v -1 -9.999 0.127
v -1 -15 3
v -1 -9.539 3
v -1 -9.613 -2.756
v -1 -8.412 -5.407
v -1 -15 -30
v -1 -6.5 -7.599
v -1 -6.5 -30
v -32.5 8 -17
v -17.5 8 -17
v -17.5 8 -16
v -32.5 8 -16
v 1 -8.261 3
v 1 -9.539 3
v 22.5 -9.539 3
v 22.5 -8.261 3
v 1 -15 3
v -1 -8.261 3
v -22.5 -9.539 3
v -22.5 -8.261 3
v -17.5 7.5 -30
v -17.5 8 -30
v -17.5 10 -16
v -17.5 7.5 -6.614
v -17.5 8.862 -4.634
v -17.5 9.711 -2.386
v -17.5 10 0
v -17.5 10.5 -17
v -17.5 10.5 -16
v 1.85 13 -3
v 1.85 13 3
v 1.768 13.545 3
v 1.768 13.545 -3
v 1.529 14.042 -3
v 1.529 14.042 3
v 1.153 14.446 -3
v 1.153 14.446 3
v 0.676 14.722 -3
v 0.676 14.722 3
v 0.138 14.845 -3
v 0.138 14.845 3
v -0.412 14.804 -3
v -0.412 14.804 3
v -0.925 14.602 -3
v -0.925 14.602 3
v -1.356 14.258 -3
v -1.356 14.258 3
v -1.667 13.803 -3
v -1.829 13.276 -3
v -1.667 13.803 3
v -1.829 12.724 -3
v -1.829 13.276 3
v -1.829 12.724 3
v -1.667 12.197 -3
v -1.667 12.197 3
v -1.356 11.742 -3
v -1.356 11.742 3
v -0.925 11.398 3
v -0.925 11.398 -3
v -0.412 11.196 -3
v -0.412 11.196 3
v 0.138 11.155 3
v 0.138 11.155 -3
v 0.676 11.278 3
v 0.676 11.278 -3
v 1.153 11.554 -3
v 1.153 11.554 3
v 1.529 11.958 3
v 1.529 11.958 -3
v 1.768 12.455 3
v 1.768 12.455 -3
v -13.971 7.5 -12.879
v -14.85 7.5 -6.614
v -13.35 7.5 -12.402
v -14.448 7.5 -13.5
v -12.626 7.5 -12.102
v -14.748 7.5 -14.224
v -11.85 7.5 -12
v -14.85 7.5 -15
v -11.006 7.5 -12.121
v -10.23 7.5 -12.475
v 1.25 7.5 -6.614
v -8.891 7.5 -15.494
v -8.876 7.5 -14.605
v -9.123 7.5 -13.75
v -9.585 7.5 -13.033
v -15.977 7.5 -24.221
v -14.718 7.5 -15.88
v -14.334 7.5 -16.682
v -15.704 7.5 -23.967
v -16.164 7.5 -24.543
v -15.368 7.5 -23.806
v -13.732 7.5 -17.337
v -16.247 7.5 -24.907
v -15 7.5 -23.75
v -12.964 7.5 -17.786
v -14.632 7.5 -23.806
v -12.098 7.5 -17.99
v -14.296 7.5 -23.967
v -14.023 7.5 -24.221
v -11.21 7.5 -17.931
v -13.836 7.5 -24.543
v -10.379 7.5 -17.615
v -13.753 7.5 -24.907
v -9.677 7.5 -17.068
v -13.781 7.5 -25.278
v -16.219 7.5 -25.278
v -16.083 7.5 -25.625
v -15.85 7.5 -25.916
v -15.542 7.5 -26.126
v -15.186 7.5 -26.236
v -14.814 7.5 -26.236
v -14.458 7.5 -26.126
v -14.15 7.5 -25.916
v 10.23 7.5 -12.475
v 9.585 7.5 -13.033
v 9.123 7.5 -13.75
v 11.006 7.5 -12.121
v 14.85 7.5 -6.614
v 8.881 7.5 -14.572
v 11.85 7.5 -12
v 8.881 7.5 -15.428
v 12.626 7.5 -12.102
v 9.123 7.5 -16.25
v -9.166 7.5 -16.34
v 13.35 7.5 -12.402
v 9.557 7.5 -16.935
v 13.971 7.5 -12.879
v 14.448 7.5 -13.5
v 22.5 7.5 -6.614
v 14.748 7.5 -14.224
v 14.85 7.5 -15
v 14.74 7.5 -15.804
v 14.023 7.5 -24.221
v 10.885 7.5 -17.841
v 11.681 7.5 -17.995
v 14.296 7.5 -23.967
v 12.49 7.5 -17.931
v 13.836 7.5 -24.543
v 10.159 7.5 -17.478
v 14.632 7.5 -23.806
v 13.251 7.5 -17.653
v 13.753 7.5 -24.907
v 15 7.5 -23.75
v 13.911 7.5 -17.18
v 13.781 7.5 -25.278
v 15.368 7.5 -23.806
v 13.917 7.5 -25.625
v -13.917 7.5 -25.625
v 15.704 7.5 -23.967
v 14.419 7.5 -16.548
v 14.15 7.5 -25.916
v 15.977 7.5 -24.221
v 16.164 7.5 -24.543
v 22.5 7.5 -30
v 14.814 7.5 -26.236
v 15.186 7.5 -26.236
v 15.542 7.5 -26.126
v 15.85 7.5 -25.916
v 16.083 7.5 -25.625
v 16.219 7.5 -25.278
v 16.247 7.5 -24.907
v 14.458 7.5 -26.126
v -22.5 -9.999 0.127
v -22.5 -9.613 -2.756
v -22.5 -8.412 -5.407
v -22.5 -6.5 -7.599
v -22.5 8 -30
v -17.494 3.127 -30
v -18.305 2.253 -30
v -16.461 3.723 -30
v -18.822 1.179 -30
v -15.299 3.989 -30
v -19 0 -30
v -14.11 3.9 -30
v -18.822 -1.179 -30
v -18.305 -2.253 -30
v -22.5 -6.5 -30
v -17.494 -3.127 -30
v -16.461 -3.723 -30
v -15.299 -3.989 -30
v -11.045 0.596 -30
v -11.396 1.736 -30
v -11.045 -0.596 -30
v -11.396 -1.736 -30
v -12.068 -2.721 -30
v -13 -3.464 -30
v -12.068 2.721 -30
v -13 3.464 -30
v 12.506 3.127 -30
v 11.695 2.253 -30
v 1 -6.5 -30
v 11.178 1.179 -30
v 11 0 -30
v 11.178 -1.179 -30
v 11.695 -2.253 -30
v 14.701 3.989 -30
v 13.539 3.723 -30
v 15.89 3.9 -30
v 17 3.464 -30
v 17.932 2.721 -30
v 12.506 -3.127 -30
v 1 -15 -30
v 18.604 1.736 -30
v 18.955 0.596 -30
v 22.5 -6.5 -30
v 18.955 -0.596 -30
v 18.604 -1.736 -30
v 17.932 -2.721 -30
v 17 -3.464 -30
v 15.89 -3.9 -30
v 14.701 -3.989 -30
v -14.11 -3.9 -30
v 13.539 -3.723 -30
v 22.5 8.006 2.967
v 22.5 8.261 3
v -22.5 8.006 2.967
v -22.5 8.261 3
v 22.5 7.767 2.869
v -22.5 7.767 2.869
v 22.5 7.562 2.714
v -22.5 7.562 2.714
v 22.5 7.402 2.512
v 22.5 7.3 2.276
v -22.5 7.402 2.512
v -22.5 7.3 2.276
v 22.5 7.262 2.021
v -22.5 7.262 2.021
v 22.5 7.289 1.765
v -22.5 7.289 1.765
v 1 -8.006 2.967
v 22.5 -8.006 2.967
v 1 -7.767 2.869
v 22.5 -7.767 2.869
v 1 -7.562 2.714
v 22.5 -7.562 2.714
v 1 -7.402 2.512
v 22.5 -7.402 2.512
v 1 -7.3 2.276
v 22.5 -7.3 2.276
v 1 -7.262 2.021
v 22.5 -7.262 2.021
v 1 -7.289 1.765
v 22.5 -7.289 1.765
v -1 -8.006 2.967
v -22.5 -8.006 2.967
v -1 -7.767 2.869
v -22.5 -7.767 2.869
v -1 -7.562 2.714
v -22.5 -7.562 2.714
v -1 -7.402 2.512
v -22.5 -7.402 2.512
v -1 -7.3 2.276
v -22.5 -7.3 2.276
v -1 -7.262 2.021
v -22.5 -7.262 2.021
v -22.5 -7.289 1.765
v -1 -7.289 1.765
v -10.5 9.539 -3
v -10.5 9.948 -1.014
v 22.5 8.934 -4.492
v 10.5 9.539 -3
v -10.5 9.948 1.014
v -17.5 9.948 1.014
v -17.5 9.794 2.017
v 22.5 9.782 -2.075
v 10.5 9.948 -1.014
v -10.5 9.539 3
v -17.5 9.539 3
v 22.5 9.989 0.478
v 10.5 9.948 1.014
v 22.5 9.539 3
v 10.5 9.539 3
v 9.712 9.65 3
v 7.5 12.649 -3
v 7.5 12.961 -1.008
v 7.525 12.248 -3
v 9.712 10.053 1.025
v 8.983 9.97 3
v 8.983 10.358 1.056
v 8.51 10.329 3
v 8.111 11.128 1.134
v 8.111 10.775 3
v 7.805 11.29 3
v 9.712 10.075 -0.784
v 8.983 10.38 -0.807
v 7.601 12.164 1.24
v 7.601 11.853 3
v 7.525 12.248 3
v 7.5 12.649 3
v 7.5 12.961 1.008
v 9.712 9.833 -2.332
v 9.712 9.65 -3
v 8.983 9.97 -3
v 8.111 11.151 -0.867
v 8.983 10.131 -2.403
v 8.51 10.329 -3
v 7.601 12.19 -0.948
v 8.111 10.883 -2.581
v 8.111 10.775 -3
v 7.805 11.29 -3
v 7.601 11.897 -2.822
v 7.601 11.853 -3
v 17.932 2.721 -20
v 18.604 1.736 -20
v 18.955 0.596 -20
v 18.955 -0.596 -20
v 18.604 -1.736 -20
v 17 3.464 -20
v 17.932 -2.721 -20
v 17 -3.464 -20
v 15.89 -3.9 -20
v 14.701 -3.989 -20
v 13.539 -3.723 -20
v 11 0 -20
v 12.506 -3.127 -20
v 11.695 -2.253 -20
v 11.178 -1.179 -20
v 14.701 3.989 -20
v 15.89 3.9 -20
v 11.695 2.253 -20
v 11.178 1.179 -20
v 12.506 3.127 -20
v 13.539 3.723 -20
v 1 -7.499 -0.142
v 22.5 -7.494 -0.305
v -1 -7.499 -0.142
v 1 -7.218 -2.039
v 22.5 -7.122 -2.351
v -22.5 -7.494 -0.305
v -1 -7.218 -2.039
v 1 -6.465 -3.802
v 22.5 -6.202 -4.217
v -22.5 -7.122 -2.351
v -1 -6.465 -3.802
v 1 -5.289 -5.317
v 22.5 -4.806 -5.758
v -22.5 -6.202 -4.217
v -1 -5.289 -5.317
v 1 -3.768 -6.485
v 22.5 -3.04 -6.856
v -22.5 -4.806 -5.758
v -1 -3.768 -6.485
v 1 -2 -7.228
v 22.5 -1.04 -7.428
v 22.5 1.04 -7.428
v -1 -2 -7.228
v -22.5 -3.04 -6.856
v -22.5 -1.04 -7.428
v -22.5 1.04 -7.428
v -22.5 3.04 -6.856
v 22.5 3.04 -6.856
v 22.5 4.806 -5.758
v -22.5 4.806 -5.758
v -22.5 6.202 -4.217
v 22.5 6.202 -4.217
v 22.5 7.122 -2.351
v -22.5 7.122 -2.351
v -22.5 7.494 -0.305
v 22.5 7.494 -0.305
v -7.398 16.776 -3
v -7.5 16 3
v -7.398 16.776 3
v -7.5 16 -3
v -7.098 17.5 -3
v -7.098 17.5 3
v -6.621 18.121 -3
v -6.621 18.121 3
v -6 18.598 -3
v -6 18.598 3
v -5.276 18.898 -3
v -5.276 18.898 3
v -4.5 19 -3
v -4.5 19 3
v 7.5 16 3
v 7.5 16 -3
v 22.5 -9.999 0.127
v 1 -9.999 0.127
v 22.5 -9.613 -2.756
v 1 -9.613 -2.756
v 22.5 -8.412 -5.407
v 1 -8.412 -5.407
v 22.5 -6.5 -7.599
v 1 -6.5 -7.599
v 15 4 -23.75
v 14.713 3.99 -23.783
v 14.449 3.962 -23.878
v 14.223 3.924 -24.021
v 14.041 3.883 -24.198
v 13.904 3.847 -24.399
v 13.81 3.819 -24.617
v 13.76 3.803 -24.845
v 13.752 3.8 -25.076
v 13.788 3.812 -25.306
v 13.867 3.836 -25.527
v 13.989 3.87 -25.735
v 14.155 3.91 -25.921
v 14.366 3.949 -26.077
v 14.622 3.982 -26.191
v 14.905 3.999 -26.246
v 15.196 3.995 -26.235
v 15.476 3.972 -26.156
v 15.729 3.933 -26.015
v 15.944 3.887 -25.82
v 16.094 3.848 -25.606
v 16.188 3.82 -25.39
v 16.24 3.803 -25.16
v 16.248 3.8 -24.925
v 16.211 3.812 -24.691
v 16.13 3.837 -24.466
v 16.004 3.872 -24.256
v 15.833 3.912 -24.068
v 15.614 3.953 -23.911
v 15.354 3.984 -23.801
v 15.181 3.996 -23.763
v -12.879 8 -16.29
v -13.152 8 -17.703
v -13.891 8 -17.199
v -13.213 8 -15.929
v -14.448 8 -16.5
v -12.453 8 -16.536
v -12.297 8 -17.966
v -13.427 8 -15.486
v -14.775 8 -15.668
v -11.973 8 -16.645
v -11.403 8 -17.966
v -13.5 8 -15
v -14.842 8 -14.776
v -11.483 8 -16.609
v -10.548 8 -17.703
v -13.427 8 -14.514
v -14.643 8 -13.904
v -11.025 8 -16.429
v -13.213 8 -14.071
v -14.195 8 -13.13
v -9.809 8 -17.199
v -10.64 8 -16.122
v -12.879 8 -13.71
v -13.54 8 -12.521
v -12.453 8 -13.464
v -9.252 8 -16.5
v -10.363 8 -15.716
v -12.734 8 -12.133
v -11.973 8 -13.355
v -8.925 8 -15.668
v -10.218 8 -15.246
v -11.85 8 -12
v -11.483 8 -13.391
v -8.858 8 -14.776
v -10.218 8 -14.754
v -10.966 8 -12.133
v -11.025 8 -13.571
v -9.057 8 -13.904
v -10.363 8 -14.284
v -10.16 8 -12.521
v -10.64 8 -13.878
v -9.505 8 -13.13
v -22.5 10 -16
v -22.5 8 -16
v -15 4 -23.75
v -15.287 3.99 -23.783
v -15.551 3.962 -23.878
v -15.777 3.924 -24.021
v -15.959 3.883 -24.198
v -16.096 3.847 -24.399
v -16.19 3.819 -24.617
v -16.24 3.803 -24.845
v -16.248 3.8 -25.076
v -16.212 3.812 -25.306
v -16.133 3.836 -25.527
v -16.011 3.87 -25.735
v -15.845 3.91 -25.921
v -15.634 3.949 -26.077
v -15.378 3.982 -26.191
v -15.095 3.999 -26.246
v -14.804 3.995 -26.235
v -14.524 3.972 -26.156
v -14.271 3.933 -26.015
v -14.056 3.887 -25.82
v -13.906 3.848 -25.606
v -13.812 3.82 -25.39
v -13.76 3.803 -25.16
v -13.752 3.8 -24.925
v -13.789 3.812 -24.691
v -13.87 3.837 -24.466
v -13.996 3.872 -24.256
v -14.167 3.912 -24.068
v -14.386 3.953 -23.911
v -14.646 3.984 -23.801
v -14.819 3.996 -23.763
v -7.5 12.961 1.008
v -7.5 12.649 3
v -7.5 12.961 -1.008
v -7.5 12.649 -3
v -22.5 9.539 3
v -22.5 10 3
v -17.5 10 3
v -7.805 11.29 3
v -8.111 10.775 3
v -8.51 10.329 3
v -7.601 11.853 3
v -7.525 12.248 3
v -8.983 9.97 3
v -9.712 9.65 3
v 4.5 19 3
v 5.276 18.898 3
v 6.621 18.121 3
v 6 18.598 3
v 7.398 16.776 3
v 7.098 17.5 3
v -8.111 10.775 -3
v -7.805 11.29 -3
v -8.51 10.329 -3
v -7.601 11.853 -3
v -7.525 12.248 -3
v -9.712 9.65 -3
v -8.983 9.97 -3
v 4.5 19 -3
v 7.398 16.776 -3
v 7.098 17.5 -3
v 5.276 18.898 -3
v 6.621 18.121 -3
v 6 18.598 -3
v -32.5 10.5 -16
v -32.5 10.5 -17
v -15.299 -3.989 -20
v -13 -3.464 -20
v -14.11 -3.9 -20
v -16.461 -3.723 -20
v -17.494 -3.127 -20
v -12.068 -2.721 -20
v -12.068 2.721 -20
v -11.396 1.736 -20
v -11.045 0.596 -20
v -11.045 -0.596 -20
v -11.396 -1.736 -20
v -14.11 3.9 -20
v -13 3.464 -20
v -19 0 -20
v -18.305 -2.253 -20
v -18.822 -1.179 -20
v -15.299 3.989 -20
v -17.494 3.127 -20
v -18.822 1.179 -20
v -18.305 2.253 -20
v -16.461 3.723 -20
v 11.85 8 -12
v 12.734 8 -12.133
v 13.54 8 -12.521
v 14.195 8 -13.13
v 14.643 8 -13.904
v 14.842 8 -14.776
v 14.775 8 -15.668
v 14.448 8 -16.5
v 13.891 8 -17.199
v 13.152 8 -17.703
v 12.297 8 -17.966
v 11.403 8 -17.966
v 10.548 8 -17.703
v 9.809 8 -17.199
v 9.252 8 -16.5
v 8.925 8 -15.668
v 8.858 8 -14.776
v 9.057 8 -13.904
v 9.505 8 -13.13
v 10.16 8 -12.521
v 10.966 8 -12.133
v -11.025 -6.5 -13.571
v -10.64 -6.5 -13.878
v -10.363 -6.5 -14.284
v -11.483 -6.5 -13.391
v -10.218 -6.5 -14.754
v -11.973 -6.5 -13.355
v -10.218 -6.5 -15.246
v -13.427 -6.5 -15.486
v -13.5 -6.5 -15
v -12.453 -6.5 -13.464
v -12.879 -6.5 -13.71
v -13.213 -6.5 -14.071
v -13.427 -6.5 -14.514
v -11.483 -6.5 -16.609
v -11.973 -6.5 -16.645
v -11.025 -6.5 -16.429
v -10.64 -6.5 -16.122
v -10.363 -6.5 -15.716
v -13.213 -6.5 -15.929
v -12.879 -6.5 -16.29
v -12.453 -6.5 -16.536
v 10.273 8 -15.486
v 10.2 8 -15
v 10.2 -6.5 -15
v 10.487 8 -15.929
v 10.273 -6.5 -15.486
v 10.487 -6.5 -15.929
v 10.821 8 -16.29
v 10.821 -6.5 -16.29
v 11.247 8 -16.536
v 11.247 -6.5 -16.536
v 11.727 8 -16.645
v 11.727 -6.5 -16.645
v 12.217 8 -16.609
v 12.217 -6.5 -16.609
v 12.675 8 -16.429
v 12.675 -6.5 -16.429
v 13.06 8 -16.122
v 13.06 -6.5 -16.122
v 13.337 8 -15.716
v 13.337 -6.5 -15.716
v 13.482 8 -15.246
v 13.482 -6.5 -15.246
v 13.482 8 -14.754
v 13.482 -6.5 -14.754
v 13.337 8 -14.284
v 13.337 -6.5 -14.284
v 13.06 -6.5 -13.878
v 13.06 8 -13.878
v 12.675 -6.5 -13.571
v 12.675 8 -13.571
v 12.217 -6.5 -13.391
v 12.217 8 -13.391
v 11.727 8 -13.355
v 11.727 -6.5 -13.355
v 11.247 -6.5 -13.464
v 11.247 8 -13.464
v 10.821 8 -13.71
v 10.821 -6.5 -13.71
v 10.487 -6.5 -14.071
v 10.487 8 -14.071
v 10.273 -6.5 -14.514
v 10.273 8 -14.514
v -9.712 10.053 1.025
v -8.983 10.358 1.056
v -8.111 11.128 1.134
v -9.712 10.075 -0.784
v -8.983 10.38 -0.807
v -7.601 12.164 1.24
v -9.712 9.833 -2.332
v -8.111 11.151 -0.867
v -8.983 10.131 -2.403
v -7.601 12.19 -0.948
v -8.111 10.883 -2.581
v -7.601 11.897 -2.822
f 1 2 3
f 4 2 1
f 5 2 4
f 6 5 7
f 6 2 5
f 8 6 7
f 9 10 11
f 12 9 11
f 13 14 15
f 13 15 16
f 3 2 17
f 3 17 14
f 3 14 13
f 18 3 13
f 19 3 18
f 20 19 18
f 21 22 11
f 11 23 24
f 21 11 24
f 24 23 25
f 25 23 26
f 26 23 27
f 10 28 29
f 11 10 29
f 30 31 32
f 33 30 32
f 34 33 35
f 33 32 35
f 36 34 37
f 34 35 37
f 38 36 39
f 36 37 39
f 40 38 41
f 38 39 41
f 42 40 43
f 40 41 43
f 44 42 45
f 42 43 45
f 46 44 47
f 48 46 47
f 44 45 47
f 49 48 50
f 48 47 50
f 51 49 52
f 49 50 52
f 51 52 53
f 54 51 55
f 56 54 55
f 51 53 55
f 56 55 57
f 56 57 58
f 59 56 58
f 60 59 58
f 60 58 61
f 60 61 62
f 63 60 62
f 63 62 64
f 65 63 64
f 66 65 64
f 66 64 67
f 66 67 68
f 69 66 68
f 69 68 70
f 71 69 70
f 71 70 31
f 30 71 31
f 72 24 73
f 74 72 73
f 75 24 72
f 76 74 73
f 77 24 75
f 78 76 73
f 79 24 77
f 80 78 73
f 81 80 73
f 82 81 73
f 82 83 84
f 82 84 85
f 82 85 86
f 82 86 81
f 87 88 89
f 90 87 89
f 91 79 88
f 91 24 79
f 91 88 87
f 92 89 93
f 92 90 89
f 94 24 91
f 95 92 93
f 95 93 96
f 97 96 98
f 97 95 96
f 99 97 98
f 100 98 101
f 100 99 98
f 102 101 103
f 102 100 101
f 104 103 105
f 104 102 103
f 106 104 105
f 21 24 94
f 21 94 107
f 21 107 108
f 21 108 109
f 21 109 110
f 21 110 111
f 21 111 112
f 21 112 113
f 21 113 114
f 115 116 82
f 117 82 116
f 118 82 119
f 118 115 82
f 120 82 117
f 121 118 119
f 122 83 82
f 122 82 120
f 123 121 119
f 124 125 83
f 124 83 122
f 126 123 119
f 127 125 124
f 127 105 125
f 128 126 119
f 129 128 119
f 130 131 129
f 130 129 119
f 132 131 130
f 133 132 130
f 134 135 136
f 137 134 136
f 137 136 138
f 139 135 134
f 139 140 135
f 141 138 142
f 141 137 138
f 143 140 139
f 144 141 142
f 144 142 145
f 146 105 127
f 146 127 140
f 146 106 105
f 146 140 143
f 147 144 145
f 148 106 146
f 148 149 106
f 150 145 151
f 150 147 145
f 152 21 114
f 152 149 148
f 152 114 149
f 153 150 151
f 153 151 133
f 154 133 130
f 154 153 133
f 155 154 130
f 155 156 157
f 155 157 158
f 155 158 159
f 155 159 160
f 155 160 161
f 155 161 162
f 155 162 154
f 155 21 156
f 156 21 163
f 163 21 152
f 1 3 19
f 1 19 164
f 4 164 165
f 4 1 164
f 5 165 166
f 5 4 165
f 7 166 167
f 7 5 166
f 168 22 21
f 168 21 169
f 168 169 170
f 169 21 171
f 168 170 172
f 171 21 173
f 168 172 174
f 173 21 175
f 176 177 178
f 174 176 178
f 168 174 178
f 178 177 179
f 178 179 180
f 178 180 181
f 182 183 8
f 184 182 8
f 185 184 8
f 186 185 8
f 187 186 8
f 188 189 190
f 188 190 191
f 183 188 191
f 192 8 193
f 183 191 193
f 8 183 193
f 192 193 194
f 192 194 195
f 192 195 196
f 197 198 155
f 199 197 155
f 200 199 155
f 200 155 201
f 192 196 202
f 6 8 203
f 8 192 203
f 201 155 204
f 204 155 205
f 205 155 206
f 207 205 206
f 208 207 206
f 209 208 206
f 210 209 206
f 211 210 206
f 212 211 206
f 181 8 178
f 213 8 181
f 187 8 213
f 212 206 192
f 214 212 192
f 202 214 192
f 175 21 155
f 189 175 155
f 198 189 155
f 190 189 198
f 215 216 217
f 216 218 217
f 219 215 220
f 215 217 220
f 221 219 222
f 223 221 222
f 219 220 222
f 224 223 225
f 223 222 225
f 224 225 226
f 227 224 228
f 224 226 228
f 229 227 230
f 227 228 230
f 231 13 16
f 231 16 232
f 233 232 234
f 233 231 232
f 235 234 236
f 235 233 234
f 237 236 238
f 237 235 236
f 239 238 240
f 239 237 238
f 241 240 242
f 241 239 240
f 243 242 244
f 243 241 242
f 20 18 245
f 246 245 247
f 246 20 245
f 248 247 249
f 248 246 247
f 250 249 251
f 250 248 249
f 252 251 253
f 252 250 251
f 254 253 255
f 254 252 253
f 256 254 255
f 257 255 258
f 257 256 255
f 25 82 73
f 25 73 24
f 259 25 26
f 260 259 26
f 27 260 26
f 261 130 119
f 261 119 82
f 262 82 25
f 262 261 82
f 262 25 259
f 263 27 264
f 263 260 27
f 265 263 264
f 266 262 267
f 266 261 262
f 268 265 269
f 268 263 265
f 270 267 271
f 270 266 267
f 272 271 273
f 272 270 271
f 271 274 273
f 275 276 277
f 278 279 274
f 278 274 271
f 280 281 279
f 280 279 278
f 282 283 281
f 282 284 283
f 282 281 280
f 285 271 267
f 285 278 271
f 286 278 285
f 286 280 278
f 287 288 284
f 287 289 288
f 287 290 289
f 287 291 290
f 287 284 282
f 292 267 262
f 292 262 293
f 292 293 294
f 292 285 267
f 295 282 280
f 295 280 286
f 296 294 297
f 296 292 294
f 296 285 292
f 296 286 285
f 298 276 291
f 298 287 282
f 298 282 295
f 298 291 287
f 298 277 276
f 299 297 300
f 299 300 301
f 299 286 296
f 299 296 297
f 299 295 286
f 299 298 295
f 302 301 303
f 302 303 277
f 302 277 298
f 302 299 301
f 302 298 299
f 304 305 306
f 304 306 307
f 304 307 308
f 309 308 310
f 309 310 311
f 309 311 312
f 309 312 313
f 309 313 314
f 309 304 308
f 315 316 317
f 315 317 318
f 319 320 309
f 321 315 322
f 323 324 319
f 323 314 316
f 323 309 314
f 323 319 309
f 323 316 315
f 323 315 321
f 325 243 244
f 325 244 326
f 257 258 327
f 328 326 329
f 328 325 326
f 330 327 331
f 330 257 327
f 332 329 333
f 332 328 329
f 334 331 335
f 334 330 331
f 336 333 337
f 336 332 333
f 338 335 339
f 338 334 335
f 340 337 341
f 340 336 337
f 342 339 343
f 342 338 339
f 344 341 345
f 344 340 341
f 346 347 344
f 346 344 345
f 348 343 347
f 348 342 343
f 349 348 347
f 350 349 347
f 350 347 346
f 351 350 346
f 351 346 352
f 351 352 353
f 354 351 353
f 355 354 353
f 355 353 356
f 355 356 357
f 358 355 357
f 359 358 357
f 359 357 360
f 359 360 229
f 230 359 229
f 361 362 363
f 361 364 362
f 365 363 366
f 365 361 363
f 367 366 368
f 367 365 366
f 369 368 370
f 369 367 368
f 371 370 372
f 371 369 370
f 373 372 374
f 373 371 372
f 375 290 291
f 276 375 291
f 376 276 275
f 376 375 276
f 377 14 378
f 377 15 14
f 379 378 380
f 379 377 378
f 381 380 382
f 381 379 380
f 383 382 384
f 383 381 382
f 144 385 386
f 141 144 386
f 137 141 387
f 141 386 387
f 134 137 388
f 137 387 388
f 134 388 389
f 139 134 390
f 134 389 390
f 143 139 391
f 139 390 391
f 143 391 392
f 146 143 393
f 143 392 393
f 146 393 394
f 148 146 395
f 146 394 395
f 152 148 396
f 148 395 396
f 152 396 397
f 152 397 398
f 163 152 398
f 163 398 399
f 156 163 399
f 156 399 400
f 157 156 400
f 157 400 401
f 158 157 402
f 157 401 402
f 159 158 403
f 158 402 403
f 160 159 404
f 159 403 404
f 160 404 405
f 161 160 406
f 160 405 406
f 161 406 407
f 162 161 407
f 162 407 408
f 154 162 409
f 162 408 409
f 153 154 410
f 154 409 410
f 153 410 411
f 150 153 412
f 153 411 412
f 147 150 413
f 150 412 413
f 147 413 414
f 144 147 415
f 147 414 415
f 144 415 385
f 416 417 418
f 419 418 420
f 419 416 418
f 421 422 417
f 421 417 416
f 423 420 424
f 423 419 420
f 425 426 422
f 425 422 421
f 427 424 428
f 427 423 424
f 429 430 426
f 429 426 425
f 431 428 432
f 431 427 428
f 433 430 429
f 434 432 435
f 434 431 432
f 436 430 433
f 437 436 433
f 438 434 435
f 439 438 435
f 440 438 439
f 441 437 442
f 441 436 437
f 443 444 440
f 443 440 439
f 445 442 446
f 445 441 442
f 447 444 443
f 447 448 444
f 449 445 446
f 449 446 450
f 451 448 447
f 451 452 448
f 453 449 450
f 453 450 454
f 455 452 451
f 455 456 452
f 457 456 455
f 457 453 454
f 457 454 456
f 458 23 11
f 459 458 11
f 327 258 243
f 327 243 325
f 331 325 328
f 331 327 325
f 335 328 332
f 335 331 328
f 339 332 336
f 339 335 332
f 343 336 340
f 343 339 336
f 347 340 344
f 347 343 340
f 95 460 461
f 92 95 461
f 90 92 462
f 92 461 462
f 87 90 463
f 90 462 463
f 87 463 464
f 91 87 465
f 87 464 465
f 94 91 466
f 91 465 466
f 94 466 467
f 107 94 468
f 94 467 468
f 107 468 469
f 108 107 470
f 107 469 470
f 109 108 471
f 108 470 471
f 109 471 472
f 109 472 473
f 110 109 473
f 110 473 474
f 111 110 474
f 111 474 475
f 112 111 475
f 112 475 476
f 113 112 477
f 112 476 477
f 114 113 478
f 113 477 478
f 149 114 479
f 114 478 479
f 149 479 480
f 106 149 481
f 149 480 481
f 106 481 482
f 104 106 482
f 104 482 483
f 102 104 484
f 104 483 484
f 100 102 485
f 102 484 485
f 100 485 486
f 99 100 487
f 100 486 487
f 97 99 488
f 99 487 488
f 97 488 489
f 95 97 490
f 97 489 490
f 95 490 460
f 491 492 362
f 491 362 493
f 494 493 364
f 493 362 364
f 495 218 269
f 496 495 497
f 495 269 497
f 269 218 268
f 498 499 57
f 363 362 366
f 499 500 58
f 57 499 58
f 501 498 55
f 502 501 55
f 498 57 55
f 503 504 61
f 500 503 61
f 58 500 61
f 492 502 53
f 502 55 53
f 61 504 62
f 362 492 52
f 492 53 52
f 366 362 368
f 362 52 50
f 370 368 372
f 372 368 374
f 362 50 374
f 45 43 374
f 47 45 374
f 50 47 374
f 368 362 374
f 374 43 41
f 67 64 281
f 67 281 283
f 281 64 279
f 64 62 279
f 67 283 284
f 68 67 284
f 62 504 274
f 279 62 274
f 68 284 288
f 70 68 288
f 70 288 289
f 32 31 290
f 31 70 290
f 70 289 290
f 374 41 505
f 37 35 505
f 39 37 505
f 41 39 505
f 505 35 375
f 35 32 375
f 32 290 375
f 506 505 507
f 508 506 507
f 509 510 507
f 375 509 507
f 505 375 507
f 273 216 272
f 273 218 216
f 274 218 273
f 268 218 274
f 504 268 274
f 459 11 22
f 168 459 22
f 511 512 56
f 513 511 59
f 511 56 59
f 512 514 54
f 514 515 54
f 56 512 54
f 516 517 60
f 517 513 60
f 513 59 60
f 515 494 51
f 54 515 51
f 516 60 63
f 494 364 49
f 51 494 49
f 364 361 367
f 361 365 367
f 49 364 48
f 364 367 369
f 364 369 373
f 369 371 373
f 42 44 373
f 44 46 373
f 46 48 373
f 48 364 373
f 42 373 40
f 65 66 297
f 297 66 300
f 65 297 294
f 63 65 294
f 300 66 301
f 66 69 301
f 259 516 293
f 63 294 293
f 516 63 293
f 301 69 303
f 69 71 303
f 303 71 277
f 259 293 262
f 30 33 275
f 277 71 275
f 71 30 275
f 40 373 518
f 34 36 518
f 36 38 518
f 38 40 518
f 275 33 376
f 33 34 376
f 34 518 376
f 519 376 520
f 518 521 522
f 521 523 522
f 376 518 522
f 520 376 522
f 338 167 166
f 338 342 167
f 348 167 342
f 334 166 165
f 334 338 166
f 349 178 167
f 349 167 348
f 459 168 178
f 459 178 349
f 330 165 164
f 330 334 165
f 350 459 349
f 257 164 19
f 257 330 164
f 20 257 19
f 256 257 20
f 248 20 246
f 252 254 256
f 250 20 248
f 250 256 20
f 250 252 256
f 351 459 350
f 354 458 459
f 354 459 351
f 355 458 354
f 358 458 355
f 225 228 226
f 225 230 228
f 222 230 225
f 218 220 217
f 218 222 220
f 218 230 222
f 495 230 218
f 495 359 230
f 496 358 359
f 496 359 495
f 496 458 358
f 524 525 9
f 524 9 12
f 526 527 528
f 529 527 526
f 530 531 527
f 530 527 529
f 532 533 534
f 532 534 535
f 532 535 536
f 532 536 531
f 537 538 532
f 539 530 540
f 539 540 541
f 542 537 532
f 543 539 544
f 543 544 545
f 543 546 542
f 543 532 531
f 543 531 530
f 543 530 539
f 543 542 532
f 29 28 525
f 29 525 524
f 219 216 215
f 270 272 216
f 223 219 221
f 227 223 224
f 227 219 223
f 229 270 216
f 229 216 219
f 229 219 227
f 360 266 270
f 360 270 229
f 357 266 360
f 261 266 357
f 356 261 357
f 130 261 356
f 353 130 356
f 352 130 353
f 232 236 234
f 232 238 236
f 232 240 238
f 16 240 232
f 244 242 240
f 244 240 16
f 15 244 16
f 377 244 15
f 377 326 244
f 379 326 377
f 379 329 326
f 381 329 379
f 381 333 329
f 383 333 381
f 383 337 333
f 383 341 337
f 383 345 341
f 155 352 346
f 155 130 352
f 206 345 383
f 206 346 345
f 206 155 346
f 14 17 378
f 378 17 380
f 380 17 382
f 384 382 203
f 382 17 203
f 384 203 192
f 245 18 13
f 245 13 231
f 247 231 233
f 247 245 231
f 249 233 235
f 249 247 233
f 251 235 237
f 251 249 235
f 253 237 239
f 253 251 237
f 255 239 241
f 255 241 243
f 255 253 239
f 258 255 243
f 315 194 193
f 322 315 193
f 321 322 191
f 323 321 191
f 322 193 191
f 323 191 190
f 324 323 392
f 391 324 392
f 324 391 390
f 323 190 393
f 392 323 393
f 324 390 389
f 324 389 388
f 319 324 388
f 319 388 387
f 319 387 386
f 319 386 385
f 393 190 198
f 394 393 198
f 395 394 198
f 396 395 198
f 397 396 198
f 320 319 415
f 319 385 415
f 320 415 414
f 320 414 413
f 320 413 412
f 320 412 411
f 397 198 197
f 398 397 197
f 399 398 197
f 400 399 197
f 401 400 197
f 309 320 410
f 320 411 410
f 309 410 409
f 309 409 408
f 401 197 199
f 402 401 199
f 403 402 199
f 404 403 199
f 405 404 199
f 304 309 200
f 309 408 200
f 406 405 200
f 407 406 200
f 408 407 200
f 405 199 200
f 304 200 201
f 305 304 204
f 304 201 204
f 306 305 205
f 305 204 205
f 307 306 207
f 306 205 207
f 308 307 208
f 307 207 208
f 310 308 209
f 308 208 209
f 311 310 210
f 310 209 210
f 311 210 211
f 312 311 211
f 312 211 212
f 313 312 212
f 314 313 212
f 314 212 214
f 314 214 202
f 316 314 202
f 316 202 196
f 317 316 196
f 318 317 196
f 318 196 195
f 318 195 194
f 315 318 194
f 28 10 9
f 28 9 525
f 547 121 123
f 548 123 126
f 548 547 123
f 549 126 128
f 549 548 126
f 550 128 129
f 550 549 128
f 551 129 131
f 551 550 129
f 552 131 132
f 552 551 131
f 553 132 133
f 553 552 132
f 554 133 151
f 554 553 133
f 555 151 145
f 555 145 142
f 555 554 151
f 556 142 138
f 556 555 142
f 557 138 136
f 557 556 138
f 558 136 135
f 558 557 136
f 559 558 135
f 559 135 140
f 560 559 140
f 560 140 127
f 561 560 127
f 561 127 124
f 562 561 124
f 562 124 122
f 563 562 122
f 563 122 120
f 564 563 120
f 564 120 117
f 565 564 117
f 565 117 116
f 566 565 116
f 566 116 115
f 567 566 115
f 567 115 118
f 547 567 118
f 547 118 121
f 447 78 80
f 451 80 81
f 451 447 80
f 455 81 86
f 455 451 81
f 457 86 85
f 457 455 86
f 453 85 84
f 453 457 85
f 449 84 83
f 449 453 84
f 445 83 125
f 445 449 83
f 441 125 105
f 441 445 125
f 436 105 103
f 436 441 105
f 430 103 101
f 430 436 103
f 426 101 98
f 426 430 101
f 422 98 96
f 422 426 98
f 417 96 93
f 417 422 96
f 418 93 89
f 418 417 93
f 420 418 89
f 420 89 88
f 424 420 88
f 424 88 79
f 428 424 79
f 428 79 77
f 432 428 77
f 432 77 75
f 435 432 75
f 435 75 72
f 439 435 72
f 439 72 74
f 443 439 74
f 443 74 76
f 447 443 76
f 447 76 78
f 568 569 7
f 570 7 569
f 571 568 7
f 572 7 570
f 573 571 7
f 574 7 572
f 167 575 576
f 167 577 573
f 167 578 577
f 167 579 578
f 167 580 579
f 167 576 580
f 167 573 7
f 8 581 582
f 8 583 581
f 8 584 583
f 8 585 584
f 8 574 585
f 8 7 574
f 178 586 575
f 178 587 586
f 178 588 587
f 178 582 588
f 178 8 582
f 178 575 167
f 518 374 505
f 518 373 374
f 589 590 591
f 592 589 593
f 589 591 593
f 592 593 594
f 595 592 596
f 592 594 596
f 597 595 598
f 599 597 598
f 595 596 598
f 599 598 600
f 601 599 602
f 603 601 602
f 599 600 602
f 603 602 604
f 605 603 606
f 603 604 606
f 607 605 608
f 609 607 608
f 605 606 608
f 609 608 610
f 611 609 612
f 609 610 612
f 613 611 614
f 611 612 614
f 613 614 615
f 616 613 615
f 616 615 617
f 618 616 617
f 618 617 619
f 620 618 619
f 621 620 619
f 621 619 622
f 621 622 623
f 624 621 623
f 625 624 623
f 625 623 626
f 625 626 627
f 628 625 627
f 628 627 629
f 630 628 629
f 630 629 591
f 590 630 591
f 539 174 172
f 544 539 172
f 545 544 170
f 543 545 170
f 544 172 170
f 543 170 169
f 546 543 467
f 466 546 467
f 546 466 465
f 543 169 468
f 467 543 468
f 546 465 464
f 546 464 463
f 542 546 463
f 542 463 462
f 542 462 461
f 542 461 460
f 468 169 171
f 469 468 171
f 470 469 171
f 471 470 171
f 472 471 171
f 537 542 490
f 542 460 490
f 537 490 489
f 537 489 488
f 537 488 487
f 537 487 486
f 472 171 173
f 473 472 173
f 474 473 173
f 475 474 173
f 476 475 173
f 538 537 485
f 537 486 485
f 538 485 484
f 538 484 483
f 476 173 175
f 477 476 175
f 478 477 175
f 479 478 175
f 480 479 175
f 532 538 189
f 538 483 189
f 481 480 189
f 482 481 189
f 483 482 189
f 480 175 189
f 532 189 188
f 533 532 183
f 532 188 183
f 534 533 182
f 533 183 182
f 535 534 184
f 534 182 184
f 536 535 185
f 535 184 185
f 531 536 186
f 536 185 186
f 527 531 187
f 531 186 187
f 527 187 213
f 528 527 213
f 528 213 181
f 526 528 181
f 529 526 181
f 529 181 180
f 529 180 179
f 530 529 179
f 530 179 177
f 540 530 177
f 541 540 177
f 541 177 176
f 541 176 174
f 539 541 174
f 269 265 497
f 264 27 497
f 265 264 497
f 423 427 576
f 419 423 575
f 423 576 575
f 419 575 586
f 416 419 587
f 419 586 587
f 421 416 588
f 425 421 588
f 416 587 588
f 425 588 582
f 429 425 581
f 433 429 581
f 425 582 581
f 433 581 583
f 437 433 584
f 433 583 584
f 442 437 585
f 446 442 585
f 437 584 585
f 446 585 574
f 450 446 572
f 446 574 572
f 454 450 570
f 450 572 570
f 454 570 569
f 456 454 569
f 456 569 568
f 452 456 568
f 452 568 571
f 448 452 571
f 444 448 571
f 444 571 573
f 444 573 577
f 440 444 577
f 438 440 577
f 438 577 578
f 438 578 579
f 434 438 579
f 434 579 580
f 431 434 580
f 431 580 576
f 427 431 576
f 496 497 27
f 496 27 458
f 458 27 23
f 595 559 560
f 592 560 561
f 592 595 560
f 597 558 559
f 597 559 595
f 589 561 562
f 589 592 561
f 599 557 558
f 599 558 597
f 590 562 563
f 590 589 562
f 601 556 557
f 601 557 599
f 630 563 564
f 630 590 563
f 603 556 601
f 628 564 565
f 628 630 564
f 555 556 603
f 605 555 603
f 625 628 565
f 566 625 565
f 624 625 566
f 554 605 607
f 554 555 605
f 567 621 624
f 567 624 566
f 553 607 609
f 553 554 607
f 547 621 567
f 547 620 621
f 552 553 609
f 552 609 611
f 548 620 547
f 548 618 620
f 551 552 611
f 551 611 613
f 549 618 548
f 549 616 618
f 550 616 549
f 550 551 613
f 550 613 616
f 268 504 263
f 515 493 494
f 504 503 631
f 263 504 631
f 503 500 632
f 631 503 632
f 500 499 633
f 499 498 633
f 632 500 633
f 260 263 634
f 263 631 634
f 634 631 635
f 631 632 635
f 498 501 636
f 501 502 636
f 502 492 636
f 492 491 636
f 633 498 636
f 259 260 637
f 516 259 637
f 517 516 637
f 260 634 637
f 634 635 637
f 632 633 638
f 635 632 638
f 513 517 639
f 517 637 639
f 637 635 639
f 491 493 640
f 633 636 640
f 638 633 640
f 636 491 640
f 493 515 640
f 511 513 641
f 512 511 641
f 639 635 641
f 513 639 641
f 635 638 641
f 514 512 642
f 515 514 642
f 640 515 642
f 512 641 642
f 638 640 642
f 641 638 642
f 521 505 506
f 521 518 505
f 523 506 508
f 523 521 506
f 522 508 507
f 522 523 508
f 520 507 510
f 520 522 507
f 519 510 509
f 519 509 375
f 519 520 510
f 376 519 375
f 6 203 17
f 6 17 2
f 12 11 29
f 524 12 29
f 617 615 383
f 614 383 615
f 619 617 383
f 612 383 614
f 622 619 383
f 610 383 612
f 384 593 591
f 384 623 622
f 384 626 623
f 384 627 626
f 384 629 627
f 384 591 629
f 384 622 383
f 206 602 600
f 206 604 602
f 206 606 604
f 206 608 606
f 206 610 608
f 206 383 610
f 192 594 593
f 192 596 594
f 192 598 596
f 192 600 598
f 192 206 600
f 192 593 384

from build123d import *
from build123d.topology import SkipClean

# Parameters (mm, degrees)
SKETCH2_R                      = 10
SKETCH2_R_2                    = 7.5
BOSS_EXTRUDE1_DEPTH            = 22.5
BOSS_EXTRUDE2_REACH            = 58.575
BOSS_EXTRUDE2_END_RADIUS       = 10
BOSS_EXTRUDE2_START            = -30
BOSS_EXTRUDE4_REACH            = 59.81
BOSS_EXTRUDE4_END_RADIUS       = 10
BOSS_EXTRUDE4_START            = 19
SKETCH5_W                      = 15
SKETCH5_H                      = 6
BOSS_EXTRUDE5_REACH            = 52.039
BOSS_EXTRUDE5_START            = 8
SKETCH6_R                      = 3
BOSS_EXTRUDE6_REACH            = 59.039
BOSS_EXTRUDE6_START            = -15
SKETCH7_R                      = 3.25
BOSS_EXTRUDE7_REACH            = 46.491
BOSS_EXTRUDE7_START            = -0.5
SKETCH9_W                      = 2.5
SKETCH9_H                      = 10.75
BOSS_EXTRUDE8_REACH            = 54.119
BOSS_EXTRUDE8_START            = -1.5
SKETCH10_W                     = 17
SKETCH10_H                     = 2.5
CUT_EXTRUDE2_DEPTH             = 43.038672797
CUT_EXTRUDE2_DEPTH_BACK        = 43.038672797
SKETCH11_W                     = 10.458909091
SKETCH11_H                     = 30
FILLET1_R                      = 1
M3X0_5_TAPPED_HOLE1_D          = 2.75
M3X0_5_TAPPED_HOLE1_DEPTH      = 8.5
M3X0_5_TAPPED_HOLE1_TIP        = 0.826183351
SKETCH14_R                     = 4
CUT_EXTRUDE3_DEPTH             = 10
M4X0_7_TAPPED_HOLE2_D          = 3.7
M4X0_7_TAPPED_HOLE2_DEPTH      = 11.5
M4X0_7_TAPPED_HOLE2_TIP        = 1.111592145
BOSS_EXTRUDE9_REACH            = 45.732
DELETEFACE1_START              = -28.2500001
DELETEFACE1_DEPTH              = 6.5000001
BOSS_EXTRUDE10_REACH           = 46.23
SKETCH20_W                     = 2
SKETCH20_H                     = 13
DELETEFACE2_START              = -1
DELETEFACE2_DEPTH              = 2
BOSS_EXTRUDE12_REACH           = 46.23
BOSS_EXTRUDE12_END_RADIUS      = 10
M4X0_7_TAPPED_HOLE1_D          = 3.3
M4X0_7_TAPPED_HOLE1_DEPTH      = 20
M4X0_7_TAPPED_HOLE1_TIP        = 0.991420021
BOSS_EXTRUDE11_DEPTH           = 10
BOSS_EXTRUDE11_DEPTH_BACK      = 5
SKETCH22_W                     = 1
SKETCH22_H                     = 2.5
BOSS_EXTRUDE13_START           = -5
BOSS_EXTRUDE13_DEPTH           = 5
SKETCH28_W                     = 1.25
SKETCH28_H                     = 7.5
M3X0_5_TAPPED_HOLE2_AT_2_COUNT = 2
M3X0_5_TAPPED_HOLE2_AT_2_PITCH = 30
FILLET4_R                      = 3


# Read off the part's stored shape, not the designer's step: DeleteFace1, DeleteFace2
with BuildPart() as part:
    # Sketch2 → Boss-Extrude1 (new, symmetric)
    with BuildSketch(Plane(origin=(0, 0, 0), x_dir=(0, 0, -1), z_dir=(1, 0, 0))):
        with Locations(Location((0, 0, 0), (0, 0, 180))):
            Circle(SKETCH2_R)
        with Locations(Location((0, 0, 0), (0, 0, 180))):
            Circle(SKETCH2_R_2, mode=Mode.SUBTRACT)
    extrude(amount=BOSS_EXTRUDE1_DEPTH, both=True)

    # Boss-Extrude2: up to this cylinder (the profile starts outside it)
    boss_extrude2_end = Plane(origin=(0, 0, 0), z_dir=(-1, 0, 0)) * Cylinder(BOSS_EXTRUDE2_END_RADIUS, 138.15, mode=Mode.PRIVATE)
    # Sketch3 → Boss-Extrude2 (add, up to the surface)
    with BuildSketch(Plane.XY.offset(BOSS_EXTRUDE2_START), mode=Mode.PRIVATE) as boss_extrude2_sk1:
        with BuildLine():
            Line((-8.815341562, 2), (8.815341562, 2))
            ThreePointArc((8.815341562, 2), (21.5, 0), (8.815341562, -2))
            Line((8.815341562, -2), (-8.815341562, -2))
            ThreePointArc((-8.815341562, -2), (-21.5, 0), (-8.815341562, 2))
        make_face()
    boss_extrude2_tool1 = extrude(boss_extrude2_sk1.sketch, amount=BOSS_EXTRUDE2_REACH, mode=Mode.PRIVATE) - boss_extrude2_end
    add(boss_extrude2_tool1.solids().sort_by_distance((0, 0, -30))[0])

    # Boss-Extrude4: up to this cylinder (the profile starts outside it)
    boss_extrude4_end = Plane(origin=(0, 0, 0), z_dir=(-1, 0, 0)) * Cylinder(BOSS_EXTRUDE4_END_RADIUS, 140.62, mode=Mode.PRIVATE)
    # Sketch5 → Boss-Extrude4 (add, up to the surface)
    with BuildSketch(Plane(origin=(0, 0, 0), x_dir=(1, 0, 0), z_dir=(0, 1, 0)).offset(BOSS_EXTRUDE4_START), mode=Mode.PRIVATE) as boss_extrude4_sk1:
        Rectangle(SKETCH5_W, SKETCH5_H)
    boss_extrude4_tool1 = extrude(boss_extrude4_sk1.sketch, amount=-BOSS_EXTRUDE4_REACH, mode=Mode.PRIVATE) - boss_extrude4_end
    add(boss_extrude4_tool1.solids().sort_by_distance((0, 19, 0))[0])

    # Sketch6 → Boss-Extrude5 (add, up to next)
    with BuildSketch(Plane(origin=(0, 0, 0), x_dir=(1, 0, 0), z_dir=(0, 1, 0)).offset(BOSS_EXTRUDE5_START), mode=Mode.PRIVATE) as boss_extrude5_sk1:
        with Locations(Location((-11.85, 15, 0), (0, 0, 270))):
            Circle(SKETCH6_R)
    boss_extrude5_tool1 = extrude(boss_extrude5_sk1.sketch, amount=-BOSS_EXTRUDE5_REACH, mode=Mode.PRIVATE) - part.part
    # Sketch6 → Boss-Extrude5 (add, up to next)
    with BuildSketch(Plane(origin=(0, 0, 0), x_dir=(1, 0, 0), z_dir=(0, 1, 0)).offset(BOSS_EXTRUDE5_START), mode=Mode.PRIVATE) as boss_extrude5_sk2:
        with Locations(Location((11.85, 15, 0), (0, 0, 270))):
            Circle(SKETCH6_R)
    boss_extrude5_tool2 = extrude(boss_extrude5_sk2.sketch, amount=-BOSS_EXTRUDE5_REACH, mode=Mode.PRIVATE) - part.part
    add(boss_extrude5_tool1.solids().sort_by_distance((-11.85, 8, -15))[0])
    add(boss_extrude5_tool2.solids().sort_by_distance((11.85, 8, -15))[0])

    # Sketch7 → Boss-Extrude6 (add, up to next)
    with BuildSketch(Plane(origin=(0, 0, 0), x_dir=(1, 0, 0), z_dir=(0, 1, 0)).offset(BOSS_EXTRUDE6_START), mode=Mode.PRIVATE) as boss_extrude6_sk1:
        with Locations(Location((-11.5, 25, 0), (0, 0, 34.305037018))):
            Circle(SKETCH7_R)
    boss_extrude6_tool1 = extrude(boss_extrude6_sk1.sketch, amount=BOSS_EXTRUDE6_REACH, mode=Mode.PRIVATE) - part.part
    # Sketch7 → Boss-Extrude6 (add, up to next)
    with BuildSketch(Plane(origin=(0, 0, 0), x_dir=(1, 0, 0), z_dir=(0, 1, 0)).offset(BOSS_EXTRUDE6_START), mode=Mode.PRIVATE) as boss_extrude6_sk2:
        with Locations(Location((11.5, 25, 0), (0, 0, 145.694962982))):
            Circle(SKETCH7_R)
    boss_extrude6_tool2 = extrude(boss_extrude6_sk2.sketch, amount=BOSS_EXTRUDE6_REACH, mode=Mode.PRIVATE) - part.part
    add(boss_extrude6_tool1.solids().sort_by_distance((-11.5, -15, -25))[0])
    add(boss_extrude6_tool2.solids().sort_by_distance((11.5, -15, -25))[0])

    # Sketch9 → Boss-Extrude7 (add, up to next)
    with BuildSketch(Plane(origin=(0, 8, 0), x_dir=(1, 0, 0), z_dir=(0, 1, 0)).offset(BOSS_EXTRUDE7_START), mode=Mode.PRIVATE) as boss_extrude7_sk1:
        with Locations((0, 8.375)):
            Rectangle(SKETCH9_W, SKETCH9_H)
    boss_extrude7_tool1 = extrude(boss_extrude7_sk1.sketch, amount=-BOSS_EXTRUDE7_REACH, mode=Mode.PRIVATE) - part.part
    # Sketch9 → Boss-Extrude7 (add, up to next)
    with BuildSketch(Plane(origin=(0, 8, 0), x_dir=(1, 0, 0), z_dir=(0, 1, 0)).offset(BOSS_EXTRUDE7_START), mode=Mode.PRIVATE) as boss_extrude7_sk2:
        with BuildLine():
            Line((-9.122821971, 16.25), (-9.122821971, 13.75))
            Line((-9.122821971, 13.75), (-1.25, 13.75))
            Line((-1.25, 13.75), (1.25, 13.75))
            Line((1.25, 13.75), (9.122821971, 13.75))
            ThreePointArc((9.122821971, 13.75), (8.85, 15), (9.122821971, 16.25))
            Line((9.122821971, 16.25), (-9.122821971, 16.25))
        make_face()
    boss_extrude7_tool2 = extrude(boss_extrude7_sk2.sketch, amount=-BOSS_EXTRUDE7_REACH, mode=Mode.PRIVATE) - part.part
    add(boss_extrude7_tool1.solids().sort_by_distance((0, 7.5, -8.375))[0])
    add(boss_extrude7_tool2.solids().sort_by_distance((-0.091621, 7.5, -15))[0])

    # Sketch10 → Boss-Extrude8 (add, up to next)
    with BuildSketch(Plane.XZ.offset(15).offset(BOSS_EXTRUDE8_START), mode=Mode.PRIVATE) as boss_extrude8_sk1:
        with Locations((0, -25)):
            Rectangle(SKETCH10_W, SKETCH10_H)
    boss_extrude8_tool1 = extrude(boss_extrude8_sk1.sketch, amount=-BOSS_EXTRUDE8_REACH, mode=Mode.PRIVATE) - part.part
    add(boss_extrude8_tool1.solids().sort_by_distance((0, -13.5, -25))[0])

    # Sketch11 → Cut-Extrude2 (cut, two sides: drawn at the far end of the back side and taken through both)
    with BuildSketch(Plane(origin=(0, 0, 0), x_dir=(0, 0, -1), z_dir=(1, 0, 0)).offset(-CUT_EXTRUDE2_DEPTH_BACK)):
        with Locations((-8.229454546, 5)):
            Rectangle(SKETCH11_W, SKETCH11_H)
    extrude(amount=CUT_EXTRUDE2_DEPTH + CUT_EXTRUDE2_DEPTH_BACK, mode=Mode.SUBTRACT)

    # Fillet1
    fillet1_edges = [part.edges().sort_by_distance(p)[0] for p in [
        (0, -6.873863542, 3),
        (0, 6.873863542, 3),
    ]]
    fillet(fillet1_edges, radius=FILLET1_R)

    # M3x0.5 Tapped Hole1
    with Locations(Plane(origin=(0, -15, 0), x_dir=(-1, 0, 0), z_dir=(0, -1, 0))):
        with Locations((-11.5, 25), (11.5, 25)):
            Hole(M3X0_5_TAPPED_HOLE1_D / 2, depth=M3X0_5_TAPPED_HOLE1_DEPTH)
            with Locations((0, 0, -(M3X0_5_TAPPED_HOLE1_DEPTH + M3X0_5_TAPPED_HOLE1_TIP / 2))):  # 118° drill point
                Cone(0, M3X0_5_TAPPED_HOLE1_D / 2, M3X0_5_TAPPED_HOLE1_TIP, mode=Mode.SUBTRACT)

    # Sketch14 → Cut-Extrude3 (cut)
    with BuildSketch(Plane(origin=(0, 0, -30), x_dir=(-1, 0, 0), z_dir=(0, 0, -1))):
        with Locations((-15, 0)):
            Circle(SKETCH14_R)
        with Locations((15, 0)):
            Circle(SKETCH14_R)
    extrude(amount=-CUT_EXTRUDE3_DEPTH, mode=Mode.SUBTRACT)

    # M4x0.7 Tapped Hole2
    with Locations(Plane(origin=(0, 0, -3), x_dir=(-1, 0, 0), z_dir=(0, 0, -1))):
        with Locations((0, 13)):
            Hole(M4X0_7_TAPPED_HOLE2_D / 2, depth=M4X0_7_TAPPED_HOLE2_DEPTH)
            with Locations((0, 0, -(M4X0_7_TAPPED_HOLE2_DEPTH + M4X0_7_TAPPED_HOLE2_TIP / 2))):  # 118° drill point
                Cone(0, M4X0_7_TAPPED_HOLE2_D / 2, M4X0_7_TAPPED_HOLE2_TIP, mode=Mode.SUBTRACT)

    # Sketch19 → Boss-Extrude9 (add, up to next)
    with BuildSketch(Plane(origin=(0, 7.5, 0), x_dir=(1, 0, 0), z_dir=(0, 1, 0)), mode=Mode.PRIVATE) as boss_extrude9_sk1:
        with BuildLine():
            Line((1.25, 6.614378278), (14.85, 6.614378278))
            Line((14.85, 6.614378278), (14.85, 15))
            ThreePointArc((14.85, 15), (12.489713183, 12.068998969), (9.122821971, 13.75))
            Line((9.122821971, 13.75), (1.25, 13.75))
            Line((1.25, 13.75), (1.25, 6.614378278))
        make_face()
    boss_extrude9_tool1 = extrude(boss_extrude9_sk1.sketch, amount=-BOSS_EXTRUDE9_REACH, mode=Mode.PRIVATE) - part.part
    # Sketch19 → Boss-Extrude9 (add, up to next)
    with BuildSketch(Plane(origin=(0, 7.5, 0), x_dir=(1, 0, 0), z_dir=(0, 1, 0)), mode=Mode.PRIVATE) as boss_extrude9_sk2:
        with BuildLine():
            Line((-14.85, 6.614378278), (-1.25, 6.614378278))
            Line((-1.25, 6.614378278), (-1.25, 13.75))
            Line((-1.25, 13.75), (-9.122821971, 13.75))
            ThreePointArc((-9.122821971, 13.75), (-12.489713183, 12.068998969), (-14.85, 15))
            Line((-14.85, 15), (-14.85, 6.614378278))
        make_face()
    boss_extrude9_tool2 = extrude(boss_extrude9_sk2.sketch, amount=-BOSS_EXTRUDE9_REACH, mode=Mode.PRIVATE) - part.part
    add(boss_extrude9_tool1.solids().sort_by_distance((7.769594, 7.5, -9.9707))[0])
    add(boss_extrude9_tool2.solids().sort_by_distance((-7.769594, 7.5, -9.9707))[0])

    # DeleteFace1 outline → DeleteFace1 (cut)
    with SkipClean():  # the faces are left unmerged after this step: merging them gives an invalid solid
        with BuildSketch(Plane.XY.offset(DELETEFACE1_START)):
            with BuildLine():
                ThreePointArc((16, -6.422616289), (11.592646997, -5.535336079), (8.815341562, -2))
                Line((8.815341562, -2), (-8.815341562, -2))
                ThreePointArc((-8.815341562, -2), (-11.592646997, -5.535336079), (-16, -6.422616289))
                Line((-16, -6.422616289), (-16, -15))
                Line((-16, -15), (-3.317867395, -15))
                Line((-3.317867395, -15), (-3.802938645, -13.5))
                Line((-3.802938645, -13.5), (3.802938645, -13.5))
                Line((3.802938645, -13.5), (3.317867395, -15))
                Line((3.317867395, -15), (16, -15))
                Line((16, -15), (16, -6.422616289))
            make_face()
        extrude(amount=DELETEFACE1_DEPTH, mode=Mode.SUBTRACT)

    # Boss-Extrude10: up to this face of the body (flat: up to its plane)
    boss_extrude10_end = Plane(part.part.faces().sort_by_distance((0, -8.900373918, 3))[0])
    # Sketch20 → Boss-Extrude10 (add, up to the picked face)
    with BuildSketch(Plane(origin=(0, 0, -30), x_dir=(-1, 0, 0), z_dir=(0, 0, -1)), mode=Mode.PRIVATE) as boss_extrude10_sk1:
        with Locations((0, -8.5)):
            Rectangle(SKETCH20_W, SKETCH20_H)
    boss_extrude10_tool1 = split(extrude(boss_extrude10_sk1.sketch, amount=-BOSS_EXTRUDE10_REACH, mode=Mode.PRIVATE), bisect_by=boss_extrude10_end, keep=Keep.BOTH, mode=Mode.PRIVATE)
    add(boss_extrude10_tool1.solids().sort_by(Axis((0, -8.5, -30), (0, 0, 1)))[0])

    # DeleteFace2 outline → DeleteFace2 (cut)
    with SkipClean():  # the faces are left unmerged after this step: merging them gives an invalid solid
        with BuildSketch(Plane.YZ.offset(DELETEFACE2_START)):
            with BuildLine():
                ThreePointArc((-7.289431607, 1.764705882), (-6.464707716, -3.802309055), (-2, -7.228416147))
                Line((-2, -7.228416147), (-2, 3))
                Line((-2, 3), (-8.261355821, 3))
                ThreePointArc((-8.261355821, 3), (-7.475450573, 2.618346942), (-7.289431607, 1.764705882))
            make_face()
        extrude(amount=DELETEFACE2_DEPTH, mode=Mode.SUBTRACT)

    # Boss-Extrude12: up to this cylinder (the profile starts outside it)
    boss_extrude12_end = Plane(origin=(0, 0, 0), z_dir=(-1, 0, 0)) * Cylinder(BOSS_EXTRUDE12_END_RADIUS, 125.136314, mode=Mode.PRIVATE)
    # Sketch23 → Boss-Extrude12 (add, up to the surface)
    with BuildSketch(Plane(origin=(0, 0, -30), x_dir=(-1, 0, 0), z_dir=(0, 0, -1)), mode=Mode.PRIVATE) as boss_extrude12_sk1:
        with BuildLine():
            Line((22.5, 7.5), (-22.5, 7.5))
            Line((-22.5, 7.5), (-22.5, -6.5))
            Line((-22.5, -6.5), (-14.999999993, -6.5))
            ThreePointArc((-14.999999993, -6.5), (-20.255949012, 3.824264632), (-8.815341562, 2))
            Line((-8.815341562, 2), (8.815341562, 2))
            ThreePointArc((8.815341562, 2), (20.25594901, 3.824264635), (15, -6.5))
            Line((15, -6.5), (22.5, -6.5))
            Line((22.5, -6.5), (22.5, 7.5))
        make_face()
    boss_extrude12_tool1 = extrude(boss_extrude12_sk1.sketch, amount=-BOSS_EXTRUDE12_REACH, mode=Mode.PRIVATE) - boss_extrude12_end
    add(boss_extrude12_tool1.solids().sort_by_distance((0, 3.628261, -30))[0])
    # Sketch23 → Boss-Extrude12 (add, up to the surface)
    with BuildSketch(Plane(origin=(0, 0, -30), x_dir=(-1, 0, 0), z_dir=(0, 0, -1)), mode=Mode.PRIVATE) as boss_extrude12_sk2:
        with BuildLine():
            ThreePointArc((-8.815341562, -2), (-11.175735362, -5.255949008), (-14.999999993, -6.5))
            Line((-14.999999993, -6.5), (-1, -6.5))
            Line((-1, -6.5), (-1, -2))
            Line((-1, -2), (-8.815341562, -2))
        make_face()
    boss_extrude12_tool2 = extrude(boss_extrude12_sk2.sketch, amount=-BOSS_EXTRUDE12_REACH, mode=Mode.PRIVATE) - boss_extrude12_end
    add(boss_extrude12_tool2.solids().sort_by_distance((5.838157, -4.433255, -30))[0])
    # Sketch23 → Boss-Extrude12 (add, up to the surface)
    with BuildSketch(Plane(origin=(0, 0, -30), x_dir=(-1, 0, 0), z_dir=(0, 0, -1)), mode=Mode.PRIVATE) as boss_extrude12_sk3:
        with BuildLine():
            Line((1, -6.5), (15, -6.5))
            ThreePointArc((15, -6.5), (11.175735365, -5.25594901), (8.815341562, -2))
            Line((8.815341562, -2), (1, -2))
            Line((1, -2), (1, -6.5))
        make_face()
    boss_extrude12_tool3 = extrude(boss_extrude12_sk3.sketch, amount=-BOSS_EXTRUDE12_REACH, mode=Mode.PRIVATE) - boss_extrude12_end
    add(boss_extrude12_tool3.solids().sort_by_distance((-5.838157, -4.433255, -30))[0])

    # M4x0.7 Tapped Hole1
    with Locations(Plane(origin=(0, 8, 0), x_dir=(1, 0, 0), z_dir=(0, 1, 0))):
        with Locations((11.85, 15), (-11.85, 15)):
            Hole(M4X0_7_TAPPED_HOLE1_D / 2, depth=M4X0_7_TAPPED_HOLE1_DEPTH)
            with Locations((0, 0, -(M4X0_7_TAPPED_HOLE1_DEPTH + M4X0_7_TAPPED_HOLE1_TIP / 2))):  # 118° drill point
                Cone(0, M4X0_7_TAPPED_HOLE1_D / 2, M4X0_7_TAPPED_HOLE1_TIP, mode=Mode.SUBTRACT)

    # Sketch24 → Boss-Extrude13 (add)
    with BuildSketch(Plane.ZY.offset(22.5).offset(BOSS_EXTRUDE13_START)):
        with BuildLine():
            ThreePointArc((-6.614378278, 7.5), (-3.535533906, 9.354143467), (0, 10))
            Line((0, 10), (-16, 10))
            Line((-16, 10), (-16, 8))
            Line((-16, 8), (-30, 8))
            Line((-30, 8), (-30, 7.5))
            Line((-30, 7.5), (-6.614378278, 7.5))
        make_face()
        with BuildLine():
            ThreePointArc((0, 10), (1.517576993, 9.884177258), (3, 9.539392014))
            Line((3, 9.539392014), (3, 10))
            Line((3, 10), (0, 10))
        make_face()
    extrude(amount=BOSS_EXTRUDE13_DEPTH)

    # Sketch28 → M3x0.5 Tapped Hole2 (revolve, cut)
    with BuildSketch(Plane(origin=(-15, 7.5, -25), x_dir=(0, 0, 1), z_dir=(1, 0, 0))):
        with Locations((0.625, 3.75)):
            Rectangle(SKETCH28_W, SKETCH28_H)
    m3x0_5_tapped_hole2 = revolve(axis=Axis((-15, 13.85, -25), (0, -1, 0)), mode=Mode.SUBTRACT)

    # M3x0.5 Tapped Hole2 at 2: M3x0.5 Tapped Hole2 ×2
    with Locations(*[(i * M3X0_5_TAPPED_HOLE2_AT_2_PITCH, 0, 0) for i in range(1, M3X0_5_TAPPED_HOLE2_AT_2_COUNT)]):
        add(m3x0_5_tapped_hole2, mode=Mode.SUBTRACT)

    # Fillet4
    fillet4_edges = [part.edges().sort_by_distance(p)[0] for p in [
        (7.5, 10, 0),
        (-7.5, 10, 0),
        (7.5, 19, 0),
        (-7.5, 19, 0),
    ]]
    fillet(fillet4_edges, radius=FILLET4_R)


with BuildPart() as body_2:
    # Sketch22 → Boss-Extrude11 (new, two sides: drawn at the far end of the back side and taken through both)
    with BuildSketch(Plane.ZY.offset(22.5).offset(-BOSS_EXTRUDE11_DEPTH_BACK)):
        with Locations((-16.5, 9.25)):
            Rectangle(SKETCH22_W, SKETCH22_H)
    extrude(amount=BOSS_EXTRUDE11_DEPTH + BOSS_EXTRUDE11_DEPTH_BACK)


solid = Compound([part.part, body_2.part])
